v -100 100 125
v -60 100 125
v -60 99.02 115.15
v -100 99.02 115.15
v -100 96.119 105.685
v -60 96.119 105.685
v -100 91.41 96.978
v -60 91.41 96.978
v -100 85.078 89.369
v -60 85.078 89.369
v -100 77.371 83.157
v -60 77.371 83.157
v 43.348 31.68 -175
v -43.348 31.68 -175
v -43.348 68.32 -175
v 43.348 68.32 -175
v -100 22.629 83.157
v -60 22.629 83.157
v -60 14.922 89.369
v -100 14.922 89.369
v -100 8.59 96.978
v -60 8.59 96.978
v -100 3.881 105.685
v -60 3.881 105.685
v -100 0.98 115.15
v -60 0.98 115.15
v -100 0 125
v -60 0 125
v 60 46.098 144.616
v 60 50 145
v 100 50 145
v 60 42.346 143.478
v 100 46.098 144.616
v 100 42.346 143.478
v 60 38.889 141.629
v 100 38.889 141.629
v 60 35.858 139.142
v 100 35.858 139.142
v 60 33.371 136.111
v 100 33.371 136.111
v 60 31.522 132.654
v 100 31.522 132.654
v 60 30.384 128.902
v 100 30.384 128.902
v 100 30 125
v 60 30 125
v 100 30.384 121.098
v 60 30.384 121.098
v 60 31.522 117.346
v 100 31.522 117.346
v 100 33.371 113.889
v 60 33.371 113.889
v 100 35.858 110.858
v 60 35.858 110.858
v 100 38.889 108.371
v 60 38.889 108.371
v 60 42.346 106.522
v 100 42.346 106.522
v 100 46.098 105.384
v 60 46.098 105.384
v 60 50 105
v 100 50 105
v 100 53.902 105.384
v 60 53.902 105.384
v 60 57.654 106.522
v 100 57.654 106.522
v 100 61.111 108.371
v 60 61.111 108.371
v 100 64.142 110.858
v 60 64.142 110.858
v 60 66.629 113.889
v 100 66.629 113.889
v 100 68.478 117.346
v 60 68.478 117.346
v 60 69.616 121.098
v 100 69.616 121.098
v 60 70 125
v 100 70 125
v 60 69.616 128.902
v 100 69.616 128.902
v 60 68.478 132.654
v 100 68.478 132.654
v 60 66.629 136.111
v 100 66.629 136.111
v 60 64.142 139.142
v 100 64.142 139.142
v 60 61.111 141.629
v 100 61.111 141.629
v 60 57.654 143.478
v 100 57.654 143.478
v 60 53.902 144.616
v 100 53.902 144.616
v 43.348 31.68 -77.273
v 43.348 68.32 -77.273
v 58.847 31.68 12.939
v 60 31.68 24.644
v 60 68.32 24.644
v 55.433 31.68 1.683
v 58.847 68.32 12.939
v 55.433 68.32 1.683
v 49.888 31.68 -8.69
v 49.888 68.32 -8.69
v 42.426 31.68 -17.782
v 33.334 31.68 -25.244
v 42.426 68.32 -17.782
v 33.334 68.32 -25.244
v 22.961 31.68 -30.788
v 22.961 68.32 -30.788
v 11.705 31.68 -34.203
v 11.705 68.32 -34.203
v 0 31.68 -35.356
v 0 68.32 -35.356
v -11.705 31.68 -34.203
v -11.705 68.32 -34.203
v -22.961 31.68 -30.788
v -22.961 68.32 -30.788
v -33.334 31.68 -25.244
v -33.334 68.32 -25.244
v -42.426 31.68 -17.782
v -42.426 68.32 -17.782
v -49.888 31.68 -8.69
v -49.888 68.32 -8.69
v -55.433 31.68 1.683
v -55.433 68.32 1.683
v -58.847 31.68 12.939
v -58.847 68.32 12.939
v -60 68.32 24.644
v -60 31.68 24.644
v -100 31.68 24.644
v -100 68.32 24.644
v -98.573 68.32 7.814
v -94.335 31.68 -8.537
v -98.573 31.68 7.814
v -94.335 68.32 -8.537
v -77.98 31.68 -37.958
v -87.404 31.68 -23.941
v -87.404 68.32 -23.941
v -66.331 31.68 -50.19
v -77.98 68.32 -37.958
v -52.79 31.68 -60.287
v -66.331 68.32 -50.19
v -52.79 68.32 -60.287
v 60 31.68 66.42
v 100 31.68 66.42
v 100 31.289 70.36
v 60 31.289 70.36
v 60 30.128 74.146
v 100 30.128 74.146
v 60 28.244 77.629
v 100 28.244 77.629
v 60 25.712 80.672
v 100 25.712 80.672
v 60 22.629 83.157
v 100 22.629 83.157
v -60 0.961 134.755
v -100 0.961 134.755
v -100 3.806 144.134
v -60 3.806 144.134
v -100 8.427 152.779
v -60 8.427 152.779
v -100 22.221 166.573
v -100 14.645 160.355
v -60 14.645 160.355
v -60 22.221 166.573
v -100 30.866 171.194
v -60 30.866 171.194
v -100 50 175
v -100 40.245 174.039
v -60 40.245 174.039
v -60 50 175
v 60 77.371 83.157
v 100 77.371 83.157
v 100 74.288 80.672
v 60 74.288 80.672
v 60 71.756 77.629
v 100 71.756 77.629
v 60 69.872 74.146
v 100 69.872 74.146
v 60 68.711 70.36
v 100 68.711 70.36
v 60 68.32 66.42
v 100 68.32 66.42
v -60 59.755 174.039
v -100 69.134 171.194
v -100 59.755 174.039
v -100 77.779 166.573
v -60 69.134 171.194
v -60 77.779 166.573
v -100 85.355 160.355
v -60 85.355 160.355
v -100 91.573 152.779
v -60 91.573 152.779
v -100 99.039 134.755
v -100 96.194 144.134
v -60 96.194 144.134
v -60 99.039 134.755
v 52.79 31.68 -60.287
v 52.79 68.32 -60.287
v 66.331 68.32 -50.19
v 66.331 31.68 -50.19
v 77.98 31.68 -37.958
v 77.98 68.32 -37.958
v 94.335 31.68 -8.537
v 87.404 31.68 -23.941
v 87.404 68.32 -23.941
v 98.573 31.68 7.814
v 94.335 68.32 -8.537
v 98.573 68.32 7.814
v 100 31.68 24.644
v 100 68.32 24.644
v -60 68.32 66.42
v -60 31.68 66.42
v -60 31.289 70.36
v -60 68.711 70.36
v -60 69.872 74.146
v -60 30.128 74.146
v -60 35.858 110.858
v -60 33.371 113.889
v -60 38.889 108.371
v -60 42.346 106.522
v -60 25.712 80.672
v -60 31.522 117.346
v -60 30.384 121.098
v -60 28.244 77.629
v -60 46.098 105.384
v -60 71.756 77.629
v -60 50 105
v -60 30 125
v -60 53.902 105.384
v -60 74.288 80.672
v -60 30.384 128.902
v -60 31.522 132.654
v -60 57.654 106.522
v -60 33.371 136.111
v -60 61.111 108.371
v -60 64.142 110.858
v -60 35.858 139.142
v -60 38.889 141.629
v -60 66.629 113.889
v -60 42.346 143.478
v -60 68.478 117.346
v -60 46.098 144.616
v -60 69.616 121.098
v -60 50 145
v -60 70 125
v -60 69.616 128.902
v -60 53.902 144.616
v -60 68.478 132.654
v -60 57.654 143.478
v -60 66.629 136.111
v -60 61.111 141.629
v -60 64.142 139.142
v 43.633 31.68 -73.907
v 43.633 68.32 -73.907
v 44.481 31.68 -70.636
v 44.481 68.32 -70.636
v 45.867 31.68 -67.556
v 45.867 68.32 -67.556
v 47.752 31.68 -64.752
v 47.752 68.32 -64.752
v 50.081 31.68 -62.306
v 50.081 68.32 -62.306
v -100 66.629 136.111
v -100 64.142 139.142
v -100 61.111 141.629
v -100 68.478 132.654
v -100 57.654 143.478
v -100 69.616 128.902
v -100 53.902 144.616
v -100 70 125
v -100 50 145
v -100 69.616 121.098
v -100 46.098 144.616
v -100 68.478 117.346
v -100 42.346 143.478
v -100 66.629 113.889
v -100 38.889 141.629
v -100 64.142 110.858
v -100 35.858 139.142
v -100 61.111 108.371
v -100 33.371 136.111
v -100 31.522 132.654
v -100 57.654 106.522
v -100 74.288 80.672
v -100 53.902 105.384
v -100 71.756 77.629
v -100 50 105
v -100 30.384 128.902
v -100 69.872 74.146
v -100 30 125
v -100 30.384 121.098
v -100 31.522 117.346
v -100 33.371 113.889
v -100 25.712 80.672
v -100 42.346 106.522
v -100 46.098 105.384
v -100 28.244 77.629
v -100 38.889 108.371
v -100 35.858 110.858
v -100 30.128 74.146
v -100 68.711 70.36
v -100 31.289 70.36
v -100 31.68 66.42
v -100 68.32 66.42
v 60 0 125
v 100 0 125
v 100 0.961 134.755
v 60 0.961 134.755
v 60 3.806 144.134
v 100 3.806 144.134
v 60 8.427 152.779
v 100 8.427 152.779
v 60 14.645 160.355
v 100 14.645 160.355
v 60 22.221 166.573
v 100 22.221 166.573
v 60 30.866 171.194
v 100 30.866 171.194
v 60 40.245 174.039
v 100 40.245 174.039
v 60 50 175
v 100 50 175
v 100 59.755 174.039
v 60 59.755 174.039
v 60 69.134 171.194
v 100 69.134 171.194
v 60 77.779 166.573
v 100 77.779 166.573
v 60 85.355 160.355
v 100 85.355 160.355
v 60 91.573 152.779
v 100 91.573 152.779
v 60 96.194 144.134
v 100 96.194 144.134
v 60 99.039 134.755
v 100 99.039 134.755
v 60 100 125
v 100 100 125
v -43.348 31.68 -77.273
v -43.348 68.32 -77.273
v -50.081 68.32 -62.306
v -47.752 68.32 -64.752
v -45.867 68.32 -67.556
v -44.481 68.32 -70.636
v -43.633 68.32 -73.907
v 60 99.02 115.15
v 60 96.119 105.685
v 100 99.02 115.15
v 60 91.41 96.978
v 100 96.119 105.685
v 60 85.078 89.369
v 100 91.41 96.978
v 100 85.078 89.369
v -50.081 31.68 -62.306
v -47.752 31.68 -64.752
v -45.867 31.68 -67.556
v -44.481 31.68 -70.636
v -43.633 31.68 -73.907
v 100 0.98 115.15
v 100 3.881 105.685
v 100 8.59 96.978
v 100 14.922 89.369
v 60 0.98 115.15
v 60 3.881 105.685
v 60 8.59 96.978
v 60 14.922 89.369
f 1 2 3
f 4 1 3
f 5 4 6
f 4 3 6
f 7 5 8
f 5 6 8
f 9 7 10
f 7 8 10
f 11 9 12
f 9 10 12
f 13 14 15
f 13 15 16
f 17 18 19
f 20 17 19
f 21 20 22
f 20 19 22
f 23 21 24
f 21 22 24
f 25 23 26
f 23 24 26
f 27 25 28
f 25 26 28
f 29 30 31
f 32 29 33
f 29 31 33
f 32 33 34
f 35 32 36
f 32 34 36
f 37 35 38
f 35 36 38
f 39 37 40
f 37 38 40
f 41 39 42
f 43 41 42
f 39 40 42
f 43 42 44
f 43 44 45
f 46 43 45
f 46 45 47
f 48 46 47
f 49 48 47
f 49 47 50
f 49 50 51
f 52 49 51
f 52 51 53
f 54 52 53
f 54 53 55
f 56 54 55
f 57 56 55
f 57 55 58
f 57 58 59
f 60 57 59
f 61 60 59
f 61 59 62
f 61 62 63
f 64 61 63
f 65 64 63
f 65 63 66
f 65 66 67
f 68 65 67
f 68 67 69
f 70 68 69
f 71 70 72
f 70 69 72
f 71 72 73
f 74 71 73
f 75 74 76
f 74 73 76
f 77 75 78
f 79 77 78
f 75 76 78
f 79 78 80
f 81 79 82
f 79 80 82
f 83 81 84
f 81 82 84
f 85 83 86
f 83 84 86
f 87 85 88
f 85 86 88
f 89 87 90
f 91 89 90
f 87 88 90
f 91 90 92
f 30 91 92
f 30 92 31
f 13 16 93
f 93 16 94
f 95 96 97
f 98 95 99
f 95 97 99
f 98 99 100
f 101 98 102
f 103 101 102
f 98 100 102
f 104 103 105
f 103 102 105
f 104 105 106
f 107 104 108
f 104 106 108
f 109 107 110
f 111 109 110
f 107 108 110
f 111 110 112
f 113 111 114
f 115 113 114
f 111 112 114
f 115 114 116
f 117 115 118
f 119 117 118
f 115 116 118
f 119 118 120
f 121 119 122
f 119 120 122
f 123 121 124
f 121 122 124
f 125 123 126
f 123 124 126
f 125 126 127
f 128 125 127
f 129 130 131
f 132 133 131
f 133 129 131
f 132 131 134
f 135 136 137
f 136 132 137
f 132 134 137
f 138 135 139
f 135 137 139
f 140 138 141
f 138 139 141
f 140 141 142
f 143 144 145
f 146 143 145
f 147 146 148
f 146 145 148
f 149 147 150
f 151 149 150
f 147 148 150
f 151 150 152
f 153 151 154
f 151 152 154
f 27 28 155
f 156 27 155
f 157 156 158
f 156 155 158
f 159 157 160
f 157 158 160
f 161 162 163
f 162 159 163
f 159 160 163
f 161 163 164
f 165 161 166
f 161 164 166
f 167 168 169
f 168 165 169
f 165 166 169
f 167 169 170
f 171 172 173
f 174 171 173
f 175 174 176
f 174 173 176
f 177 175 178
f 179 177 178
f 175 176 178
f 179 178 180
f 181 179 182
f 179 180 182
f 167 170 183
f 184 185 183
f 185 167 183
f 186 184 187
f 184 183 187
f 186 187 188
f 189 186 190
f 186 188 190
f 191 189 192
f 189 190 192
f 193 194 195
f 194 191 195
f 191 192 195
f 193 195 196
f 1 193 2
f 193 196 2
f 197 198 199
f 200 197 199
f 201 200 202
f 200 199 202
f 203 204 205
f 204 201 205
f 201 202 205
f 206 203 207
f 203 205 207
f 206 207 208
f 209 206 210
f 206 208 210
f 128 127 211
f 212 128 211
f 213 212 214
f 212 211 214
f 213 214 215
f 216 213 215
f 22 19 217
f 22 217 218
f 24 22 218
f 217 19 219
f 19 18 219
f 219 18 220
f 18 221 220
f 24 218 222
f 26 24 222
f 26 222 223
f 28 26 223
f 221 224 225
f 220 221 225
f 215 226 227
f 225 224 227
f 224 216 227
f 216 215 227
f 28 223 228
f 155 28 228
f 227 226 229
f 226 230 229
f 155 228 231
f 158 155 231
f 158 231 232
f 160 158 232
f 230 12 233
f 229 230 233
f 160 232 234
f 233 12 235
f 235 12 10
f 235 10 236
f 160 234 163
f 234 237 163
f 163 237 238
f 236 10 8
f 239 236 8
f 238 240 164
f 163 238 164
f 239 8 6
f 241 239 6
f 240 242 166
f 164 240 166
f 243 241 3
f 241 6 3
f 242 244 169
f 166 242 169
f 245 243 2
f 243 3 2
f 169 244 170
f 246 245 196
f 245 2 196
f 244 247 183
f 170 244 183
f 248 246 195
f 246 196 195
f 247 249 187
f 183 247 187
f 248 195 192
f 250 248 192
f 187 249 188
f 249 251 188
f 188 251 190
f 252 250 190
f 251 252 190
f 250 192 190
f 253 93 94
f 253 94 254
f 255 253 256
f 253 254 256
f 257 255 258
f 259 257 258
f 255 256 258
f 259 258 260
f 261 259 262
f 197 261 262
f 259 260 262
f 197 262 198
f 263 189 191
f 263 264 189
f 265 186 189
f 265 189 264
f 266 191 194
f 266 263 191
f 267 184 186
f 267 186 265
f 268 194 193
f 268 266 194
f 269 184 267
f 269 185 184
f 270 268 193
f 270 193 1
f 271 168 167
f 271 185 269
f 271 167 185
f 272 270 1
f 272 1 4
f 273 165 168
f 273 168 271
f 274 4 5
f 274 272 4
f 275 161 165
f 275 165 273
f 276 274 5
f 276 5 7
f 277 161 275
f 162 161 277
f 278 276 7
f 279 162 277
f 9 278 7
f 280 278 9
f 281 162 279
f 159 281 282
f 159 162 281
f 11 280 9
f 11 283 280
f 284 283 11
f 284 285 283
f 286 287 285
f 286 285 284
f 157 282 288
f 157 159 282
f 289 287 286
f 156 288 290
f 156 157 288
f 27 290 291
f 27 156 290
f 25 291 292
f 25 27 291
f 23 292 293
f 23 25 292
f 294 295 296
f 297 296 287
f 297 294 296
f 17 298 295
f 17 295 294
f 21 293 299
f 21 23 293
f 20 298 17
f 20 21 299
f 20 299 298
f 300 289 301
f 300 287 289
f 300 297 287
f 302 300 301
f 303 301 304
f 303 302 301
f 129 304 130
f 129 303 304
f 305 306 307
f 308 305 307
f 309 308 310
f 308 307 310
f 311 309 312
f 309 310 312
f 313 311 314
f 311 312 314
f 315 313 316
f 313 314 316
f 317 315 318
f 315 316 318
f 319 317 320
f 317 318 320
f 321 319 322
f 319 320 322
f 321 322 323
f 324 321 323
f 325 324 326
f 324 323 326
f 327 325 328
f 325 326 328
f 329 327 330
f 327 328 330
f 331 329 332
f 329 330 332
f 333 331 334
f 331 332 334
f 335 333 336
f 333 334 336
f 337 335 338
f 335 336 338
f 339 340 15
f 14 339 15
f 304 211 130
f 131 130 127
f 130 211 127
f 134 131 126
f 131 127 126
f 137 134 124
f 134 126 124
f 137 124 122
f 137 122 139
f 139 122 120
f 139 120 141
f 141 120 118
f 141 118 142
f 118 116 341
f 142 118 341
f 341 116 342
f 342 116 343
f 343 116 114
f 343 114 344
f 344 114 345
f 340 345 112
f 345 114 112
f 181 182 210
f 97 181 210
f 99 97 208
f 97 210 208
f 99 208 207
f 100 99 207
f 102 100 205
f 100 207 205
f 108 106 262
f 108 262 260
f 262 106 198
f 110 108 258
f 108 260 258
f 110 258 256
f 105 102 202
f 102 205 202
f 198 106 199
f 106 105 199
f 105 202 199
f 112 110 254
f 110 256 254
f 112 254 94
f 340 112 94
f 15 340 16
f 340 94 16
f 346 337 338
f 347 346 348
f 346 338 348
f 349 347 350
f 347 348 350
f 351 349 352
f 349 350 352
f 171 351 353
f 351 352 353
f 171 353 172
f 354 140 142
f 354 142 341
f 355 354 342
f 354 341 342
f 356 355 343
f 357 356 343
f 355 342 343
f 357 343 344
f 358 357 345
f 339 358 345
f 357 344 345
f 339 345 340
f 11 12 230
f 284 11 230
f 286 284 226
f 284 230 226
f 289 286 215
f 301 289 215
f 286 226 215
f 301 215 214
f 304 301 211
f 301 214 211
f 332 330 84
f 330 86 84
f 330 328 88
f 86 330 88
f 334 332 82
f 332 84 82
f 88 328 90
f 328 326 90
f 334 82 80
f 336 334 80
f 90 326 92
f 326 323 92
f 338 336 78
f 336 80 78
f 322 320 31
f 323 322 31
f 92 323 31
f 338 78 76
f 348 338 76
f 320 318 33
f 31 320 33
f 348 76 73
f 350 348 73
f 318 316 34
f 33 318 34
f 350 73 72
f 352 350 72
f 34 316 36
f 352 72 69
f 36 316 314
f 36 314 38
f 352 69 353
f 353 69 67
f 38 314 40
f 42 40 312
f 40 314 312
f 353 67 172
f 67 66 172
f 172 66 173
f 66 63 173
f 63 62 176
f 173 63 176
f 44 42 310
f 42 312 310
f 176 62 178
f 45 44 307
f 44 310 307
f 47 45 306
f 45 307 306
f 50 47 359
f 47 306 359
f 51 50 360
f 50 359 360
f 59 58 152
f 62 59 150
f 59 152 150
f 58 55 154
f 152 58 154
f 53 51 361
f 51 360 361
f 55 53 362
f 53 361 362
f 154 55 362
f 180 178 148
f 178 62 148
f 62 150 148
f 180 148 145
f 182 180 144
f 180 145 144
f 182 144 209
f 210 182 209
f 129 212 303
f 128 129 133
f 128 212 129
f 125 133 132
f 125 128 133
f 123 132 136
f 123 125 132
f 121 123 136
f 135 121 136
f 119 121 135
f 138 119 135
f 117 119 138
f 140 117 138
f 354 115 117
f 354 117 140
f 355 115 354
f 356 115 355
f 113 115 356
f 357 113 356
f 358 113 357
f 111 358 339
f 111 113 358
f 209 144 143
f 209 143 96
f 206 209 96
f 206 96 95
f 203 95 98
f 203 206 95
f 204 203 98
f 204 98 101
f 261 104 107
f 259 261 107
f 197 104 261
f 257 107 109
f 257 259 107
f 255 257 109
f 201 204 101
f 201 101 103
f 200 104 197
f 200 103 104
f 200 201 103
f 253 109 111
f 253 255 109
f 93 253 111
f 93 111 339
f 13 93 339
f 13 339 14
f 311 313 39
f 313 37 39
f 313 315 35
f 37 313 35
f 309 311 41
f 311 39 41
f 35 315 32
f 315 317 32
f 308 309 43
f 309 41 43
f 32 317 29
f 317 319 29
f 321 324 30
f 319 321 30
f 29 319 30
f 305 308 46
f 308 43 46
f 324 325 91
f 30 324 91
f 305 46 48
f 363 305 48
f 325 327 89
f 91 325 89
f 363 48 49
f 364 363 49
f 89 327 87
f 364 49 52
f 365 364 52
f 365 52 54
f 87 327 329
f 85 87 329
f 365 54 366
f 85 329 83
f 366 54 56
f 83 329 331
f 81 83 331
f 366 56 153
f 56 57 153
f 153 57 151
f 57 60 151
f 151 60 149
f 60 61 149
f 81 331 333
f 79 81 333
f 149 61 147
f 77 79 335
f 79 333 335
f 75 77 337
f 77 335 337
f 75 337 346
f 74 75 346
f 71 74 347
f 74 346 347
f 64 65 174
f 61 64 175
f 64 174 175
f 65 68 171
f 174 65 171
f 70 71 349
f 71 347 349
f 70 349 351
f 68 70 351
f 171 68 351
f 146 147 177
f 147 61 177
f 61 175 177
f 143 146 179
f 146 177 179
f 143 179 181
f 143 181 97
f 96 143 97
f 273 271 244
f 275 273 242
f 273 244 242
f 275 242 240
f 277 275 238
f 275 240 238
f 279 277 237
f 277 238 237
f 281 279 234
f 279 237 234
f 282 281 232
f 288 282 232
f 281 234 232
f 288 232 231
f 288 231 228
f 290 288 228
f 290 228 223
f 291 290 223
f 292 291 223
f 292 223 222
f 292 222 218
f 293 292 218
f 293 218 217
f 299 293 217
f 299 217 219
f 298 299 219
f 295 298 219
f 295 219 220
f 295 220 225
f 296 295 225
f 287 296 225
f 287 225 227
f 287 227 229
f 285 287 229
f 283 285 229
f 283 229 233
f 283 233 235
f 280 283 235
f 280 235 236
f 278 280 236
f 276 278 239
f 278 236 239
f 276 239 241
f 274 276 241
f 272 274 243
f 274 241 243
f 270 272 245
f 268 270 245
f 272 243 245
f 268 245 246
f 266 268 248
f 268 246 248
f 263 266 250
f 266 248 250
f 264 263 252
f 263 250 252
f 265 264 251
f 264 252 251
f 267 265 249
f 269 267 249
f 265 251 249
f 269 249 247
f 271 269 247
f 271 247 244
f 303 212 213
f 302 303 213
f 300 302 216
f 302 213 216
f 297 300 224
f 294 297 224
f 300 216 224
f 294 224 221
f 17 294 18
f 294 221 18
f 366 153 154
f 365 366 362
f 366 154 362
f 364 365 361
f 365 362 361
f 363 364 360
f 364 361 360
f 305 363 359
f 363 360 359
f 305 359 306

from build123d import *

# Parameters (mm, degrees)
SKETCH2_W           = 200
SKETCH2_H           = 350
BOSS_EXTRUDE1_DEPTH = 100
CUT_EXTRUDE3_DEPTH  = 226
SKETCH5_W           = 97.727308895
SKETCH5_H           = 31.680459025
CUT_EXTRUDE4_DEPTH  = 284.94541729


with BuildPart() as part:
    # Sketch2 → Boss-Extrude1 (new body)
    with BuildSketch(Plane(origin=(0, 0, 0), x_dir=(1, 0, 0), z_dir=(0, 1, 0))):
        Rectangle(SKETCH2_W, SKETCH2_H)
    extrude(amount=BOSS_EXTRUDE1_DEPTH)

    # Sketch4 → Cut-Extrude3 (cut, through all)
    with BuildSketch(Plane(origin=(0, 100, 0), x_dir=(1, 0, 0), z_dir=(0, 1, 0))):
        with BuildLine():
            Line((100, 175), (43.347633031, 175))
            Line((43.347633031, 175), (43.347633031, 77.272691105))
            ThreePointArc((43.347633031, 77.272691105), (45.866803863, 67.555664213), (52.789694192, 60.286522394))
            ThreePointArc((52.789694192, 60.286522394), (87.404145859, 23.940813259), (100, -24.644321249))
            Line((100, -24.644321249), (100, 175))
        make_face()
        with BuildLine():
            Line((-43.347633031, 77.272691105), (-43.347633031, 175))
            Line((-43.347633031, 175), (-100, 175))
            Line((-100, 175), (-100, -24.644321206))
            ThreePointArc((-100, -24.644321206), (-87.404145849, 23.940813278), (-52.789694192, 60.286522394))
            ThreePointArc((-52.789694192, 60.286522394), (-45.866803863, 67.555664213), (-43.347633031, 77.272691105))
        make_face()
        with BuildLine():
            Line((60, -175), (60, -24.644321162))
            ThreePointArc((60, -24.644321162), (0, 35.355678838), (-60, -24.644321162))
            Line((-60, -24.644321162), (-60, -175))
            Line((-60, -175), (60, -175))
        make_face()
    extrude(amount=-CUT_EXTRUDE3_DEPTH, mode=Mode.SUBTRACT)

    # Sketch5 → Cut-Extrude4 (cut, through all)
    with BuildSketch(Plane(origin=(100, 0, 0), x_dir=(0, 0, -1), z_dir=(1, 0, 0))):
        with BuildLine():
            Line((-175, 100), (-175, 50))
            ThreePointArc((-175, 50), (-160.355339059, 85.355339059), (-125, 100))
            Line((-125, 100), (-175, 100))
        make_face()
        with BuildLine():
            ThreePointArc((-105, 50), (-125, 70), (-145, 50))
            Line((-145, 50), (-105, 50))
        make_face()
        with BuildLine():
            Line((-105, 50), (-145, 50))
            ThreePointArc((-145, 50), (-125, 30), (-105, 50))
        make_face()
        with BuildLine():
            ThreePointArc((-125, 0), (-160.355339059, 14.644660941), (-175, 50))
            Line((-175, 50), (-175, 0))
            Line((-175, 0), (-125, 0))
        make_face()
        with BuildLine():
            ThreePointArc((-83.15716493, 22.628899304), (-101.215078672, 6.019578022), (-125, 0))
            Line((-125, 0), (-24.644321162, 0))
            Line((-24.644321162, 0), (-24.644321162, 31.680459025))
            Line((-24.644321162, 31.680459025), (-66.420030902, 31.680459025))
            ThreePointArc((-66.420030902, 31.680459025), (-75.933999434, 29.272627817), (-83.15716493, 22.628899304))
        make_face()
        with BuildLine():
            Line((-124.644321162, 100), (-125, 100))
            ThreePointArc((-125, 100), (-101.215078672, 93.980421978), (-83.15716493, 77.371100696))
            ThreePointArc((-83.15716493, 77.371100696), (-75.933999434, 70.727372183), (-66.420030902, 68.319540975))
            Line((-66.420030902, 68.319540975), (-24.644321162, 68.319540975))
            Line((-24.644321162, 68.319540975), (-24.644321162, 100))
            Line((-24.644321162, 100), (-124.644321162, 100))
        make_face()
        Polygon((60.286522394, 100), (-24.644321162, 100), (-24.644321162, 68.319540975), (77.272691105, 68.319540975), (77.272691105, 100), align=None)
        Polygon((-24.644321162, 31.680459025), (-24.644321162, 0), (60.286522394, 0), (77.272691105, 0), (77.272691105, 31.680459025), align=None)
        with Locations((126.136345553, 15.840229513)):
            Rectangle(SKETCH5_W, SKETCH5_H)
        with Locations((126.136345553, 84.159770487)):
            Rectangle(SKETCH5_W, SKETCH5_H)
    extrude(amount=-CUT_EXTRUDE4_DEPTH, mode=Mode.SUBTRACT)


solid = part.part
